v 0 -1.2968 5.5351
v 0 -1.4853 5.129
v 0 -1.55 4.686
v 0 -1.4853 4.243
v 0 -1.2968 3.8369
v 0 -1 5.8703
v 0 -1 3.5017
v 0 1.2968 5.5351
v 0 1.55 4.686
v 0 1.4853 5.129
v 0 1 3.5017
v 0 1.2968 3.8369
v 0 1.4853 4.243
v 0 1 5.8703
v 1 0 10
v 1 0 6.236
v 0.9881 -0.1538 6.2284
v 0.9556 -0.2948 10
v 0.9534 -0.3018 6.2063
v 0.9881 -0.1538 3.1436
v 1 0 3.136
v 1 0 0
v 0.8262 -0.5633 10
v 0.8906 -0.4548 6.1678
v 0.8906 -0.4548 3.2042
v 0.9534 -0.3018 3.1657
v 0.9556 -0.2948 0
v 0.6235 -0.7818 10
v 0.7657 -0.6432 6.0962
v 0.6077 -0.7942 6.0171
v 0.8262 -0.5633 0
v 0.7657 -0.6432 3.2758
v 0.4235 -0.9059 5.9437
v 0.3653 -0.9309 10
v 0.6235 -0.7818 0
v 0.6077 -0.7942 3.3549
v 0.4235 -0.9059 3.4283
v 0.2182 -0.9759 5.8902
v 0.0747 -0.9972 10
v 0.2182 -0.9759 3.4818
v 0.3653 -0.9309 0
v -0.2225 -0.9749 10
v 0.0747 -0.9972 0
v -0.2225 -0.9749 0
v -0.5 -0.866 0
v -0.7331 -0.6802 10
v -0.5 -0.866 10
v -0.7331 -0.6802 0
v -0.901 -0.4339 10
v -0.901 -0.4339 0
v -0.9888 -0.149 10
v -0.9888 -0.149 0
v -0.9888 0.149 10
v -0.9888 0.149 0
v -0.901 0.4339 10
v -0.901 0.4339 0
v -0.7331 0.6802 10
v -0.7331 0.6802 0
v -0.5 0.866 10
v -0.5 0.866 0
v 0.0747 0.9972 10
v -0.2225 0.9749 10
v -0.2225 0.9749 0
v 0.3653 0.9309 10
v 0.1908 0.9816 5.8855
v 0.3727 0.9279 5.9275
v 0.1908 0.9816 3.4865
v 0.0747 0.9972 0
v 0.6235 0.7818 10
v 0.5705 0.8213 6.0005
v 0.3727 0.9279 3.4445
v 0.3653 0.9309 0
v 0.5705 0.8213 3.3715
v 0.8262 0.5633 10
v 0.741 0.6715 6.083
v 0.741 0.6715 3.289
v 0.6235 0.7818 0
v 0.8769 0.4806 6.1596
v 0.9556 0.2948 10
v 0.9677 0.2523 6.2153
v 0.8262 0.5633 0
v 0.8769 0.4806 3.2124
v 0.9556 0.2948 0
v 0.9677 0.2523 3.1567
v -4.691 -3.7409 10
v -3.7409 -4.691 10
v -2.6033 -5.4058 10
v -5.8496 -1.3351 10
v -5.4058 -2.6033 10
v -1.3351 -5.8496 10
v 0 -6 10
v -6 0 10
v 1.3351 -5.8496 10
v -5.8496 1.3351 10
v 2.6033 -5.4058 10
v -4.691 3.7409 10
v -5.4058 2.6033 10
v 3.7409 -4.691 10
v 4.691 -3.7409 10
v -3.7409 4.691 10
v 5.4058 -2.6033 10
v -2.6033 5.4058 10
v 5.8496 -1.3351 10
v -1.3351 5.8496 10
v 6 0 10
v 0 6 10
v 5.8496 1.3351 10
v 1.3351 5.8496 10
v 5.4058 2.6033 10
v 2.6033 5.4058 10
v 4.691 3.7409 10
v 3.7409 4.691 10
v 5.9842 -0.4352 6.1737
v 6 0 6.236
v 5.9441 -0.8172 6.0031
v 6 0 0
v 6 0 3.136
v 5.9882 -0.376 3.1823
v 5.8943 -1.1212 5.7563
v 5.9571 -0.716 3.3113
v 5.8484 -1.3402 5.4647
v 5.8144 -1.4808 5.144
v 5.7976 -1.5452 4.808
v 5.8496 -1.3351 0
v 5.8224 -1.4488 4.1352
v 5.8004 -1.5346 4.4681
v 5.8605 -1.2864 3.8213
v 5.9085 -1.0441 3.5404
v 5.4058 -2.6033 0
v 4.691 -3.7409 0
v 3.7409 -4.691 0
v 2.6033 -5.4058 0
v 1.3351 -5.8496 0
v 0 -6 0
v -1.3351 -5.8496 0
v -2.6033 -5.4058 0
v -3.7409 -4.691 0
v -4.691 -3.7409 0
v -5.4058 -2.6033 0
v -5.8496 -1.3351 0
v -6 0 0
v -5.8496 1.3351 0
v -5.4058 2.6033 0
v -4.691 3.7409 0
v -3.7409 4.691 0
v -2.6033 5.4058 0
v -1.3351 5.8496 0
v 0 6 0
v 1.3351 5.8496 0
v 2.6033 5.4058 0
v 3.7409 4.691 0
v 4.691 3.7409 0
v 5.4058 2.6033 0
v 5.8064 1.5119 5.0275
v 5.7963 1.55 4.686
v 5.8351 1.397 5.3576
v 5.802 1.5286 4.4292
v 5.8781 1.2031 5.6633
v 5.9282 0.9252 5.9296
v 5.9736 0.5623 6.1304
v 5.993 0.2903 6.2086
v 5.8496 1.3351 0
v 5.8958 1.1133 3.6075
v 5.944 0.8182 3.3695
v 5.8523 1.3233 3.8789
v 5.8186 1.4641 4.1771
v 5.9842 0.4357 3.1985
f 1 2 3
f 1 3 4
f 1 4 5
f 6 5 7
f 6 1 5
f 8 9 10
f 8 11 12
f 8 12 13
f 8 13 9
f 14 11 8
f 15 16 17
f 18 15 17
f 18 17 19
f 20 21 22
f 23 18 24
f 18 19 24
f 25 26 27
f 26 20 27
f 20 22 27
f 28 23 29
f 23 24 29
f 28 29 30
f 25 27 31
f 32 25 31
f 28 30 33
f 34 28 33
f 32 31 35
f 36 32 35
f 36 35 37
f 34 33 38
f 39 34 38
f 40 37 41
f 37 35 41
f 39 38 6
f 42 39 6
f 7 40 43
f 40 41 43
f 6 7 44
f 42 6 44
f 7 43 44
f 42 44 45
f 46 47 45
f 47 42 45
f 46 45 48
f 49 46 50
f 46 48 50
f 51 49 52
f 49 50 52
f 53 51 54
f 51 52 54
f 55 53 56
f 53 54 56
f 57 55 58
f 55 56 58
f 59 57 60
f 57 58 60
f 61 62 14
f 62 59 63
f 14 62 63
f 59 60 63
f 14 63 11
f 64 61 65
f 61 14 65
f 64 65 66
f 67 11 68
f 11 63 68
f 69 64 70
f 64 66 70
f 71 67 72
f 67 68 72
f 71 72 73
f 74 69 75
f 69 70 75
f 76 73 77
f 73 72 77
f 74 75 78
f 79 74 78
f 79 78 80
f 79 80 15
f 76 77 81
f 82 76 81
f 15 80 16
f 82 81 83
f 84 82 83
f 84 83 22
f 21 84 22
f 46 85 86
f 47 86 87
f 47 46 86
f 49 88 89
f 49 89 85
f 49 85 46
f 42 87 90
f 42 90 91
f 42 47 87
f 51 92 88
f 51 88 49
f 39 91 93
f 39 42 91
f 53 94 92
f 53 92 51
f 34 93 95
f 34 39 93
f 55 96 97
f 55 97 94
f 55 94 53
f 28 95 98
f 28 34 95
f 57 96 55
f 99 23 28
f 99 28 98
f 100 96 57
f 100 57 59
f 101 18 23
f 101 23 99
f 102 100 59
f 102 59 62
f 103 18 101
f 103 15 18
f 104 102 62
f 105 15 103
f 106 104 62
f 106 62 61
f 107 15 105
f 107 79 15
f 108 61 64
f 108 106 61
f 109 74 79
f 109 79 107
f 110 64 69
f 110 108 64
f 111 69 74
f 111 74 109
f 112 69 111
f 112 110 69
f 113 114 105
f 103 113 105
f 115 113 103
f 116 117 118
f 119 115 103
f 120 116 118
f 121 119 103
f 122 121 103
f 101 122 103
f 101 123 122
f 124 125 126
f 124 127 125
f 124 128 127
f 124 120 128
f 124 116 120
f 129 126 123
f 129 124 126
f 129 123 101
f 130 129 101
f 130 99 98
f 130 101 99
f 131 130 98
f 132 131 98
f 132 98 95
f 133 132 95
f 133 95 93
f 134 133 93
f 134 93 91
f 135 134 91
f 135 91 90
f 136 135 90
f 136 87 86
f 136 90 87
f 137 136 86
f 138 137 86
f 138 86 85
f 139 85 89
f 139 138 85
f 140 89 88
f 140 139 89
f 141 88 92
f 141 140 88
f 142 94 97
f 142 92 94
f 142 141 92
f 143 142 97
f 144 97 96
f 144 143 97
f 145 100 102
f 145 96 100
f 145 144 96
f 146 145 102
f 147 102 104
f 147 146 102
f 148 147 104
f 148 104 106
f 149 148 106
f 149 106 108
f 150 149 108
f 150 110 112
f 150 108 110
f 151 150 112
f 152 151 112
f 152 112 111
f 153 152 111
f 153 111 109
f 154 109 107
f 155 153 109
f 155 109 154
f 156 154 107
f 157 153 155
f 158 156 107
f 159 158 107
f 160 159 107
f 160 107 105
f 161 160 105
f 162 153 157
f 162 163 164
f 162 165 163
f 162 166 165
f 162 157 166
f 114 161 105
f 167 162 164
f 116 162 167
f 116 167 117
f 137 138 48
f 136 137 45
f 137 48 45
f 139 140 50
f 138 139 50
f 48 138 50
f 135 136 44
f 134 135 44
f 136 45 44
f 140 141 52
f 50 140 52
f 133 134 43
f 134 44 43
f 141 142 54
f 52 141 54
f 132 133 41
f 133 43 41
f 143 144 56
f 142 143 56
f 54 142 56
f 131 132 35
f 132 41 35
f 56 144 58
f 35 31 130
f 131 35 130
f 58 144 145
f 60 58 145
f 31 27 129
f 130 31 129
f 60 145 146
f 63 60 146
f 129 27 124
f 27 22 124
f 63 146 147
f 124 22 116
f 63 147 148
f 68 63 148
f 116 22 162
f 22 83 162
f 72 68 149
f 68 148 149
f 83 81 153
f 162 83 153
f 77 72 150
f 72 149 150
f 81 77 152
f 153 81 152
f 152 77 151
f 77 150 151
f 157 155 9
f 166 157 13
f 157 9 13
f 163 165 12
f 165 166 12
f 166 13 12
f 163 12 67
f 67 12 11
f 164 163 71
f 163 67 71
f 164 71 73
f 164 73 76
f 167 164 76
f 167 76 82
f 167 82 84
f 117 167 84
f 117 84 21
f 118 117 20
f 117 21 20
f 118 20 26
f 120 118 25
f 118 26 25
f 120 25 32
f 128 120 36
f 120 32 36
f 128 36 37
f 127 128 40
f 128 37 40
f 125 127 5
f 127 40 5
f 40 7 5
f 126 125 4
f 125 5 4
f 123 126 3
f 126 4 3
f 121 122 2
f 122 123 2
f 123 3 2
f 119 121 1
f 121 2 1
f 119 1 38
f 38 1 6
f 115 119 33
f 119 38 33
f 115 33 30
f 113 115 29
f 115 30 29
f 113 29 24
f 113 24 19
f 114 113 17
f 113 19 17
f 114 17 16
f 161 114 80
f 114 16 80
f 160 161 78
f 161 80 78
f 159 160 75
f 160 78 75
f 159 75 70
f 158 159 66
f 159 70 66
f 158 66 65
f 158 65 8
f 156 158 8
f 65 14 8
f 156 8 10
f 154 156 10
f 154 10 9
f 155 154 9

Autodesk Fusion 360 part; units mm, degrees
sketch "Sketch1" plane through (0, 0, 0) normal (0, 0, 1) x (1, 0, 0)
  circle A0 centre (0, 0) radius 6
  circle A1 centre (0, 0) radius 1
  dimension "d1" = 2
  dimension "d12" = 12
extrude "Extrude1" add sketch "Sketch1" along normal blind 10
sketch "Sketch2" plane through (0, 0, 0) normal (1, 0, 0) x (0, 1, 0)
  circle A0 centre (0, 4.686) radius 1.55
  dimension "d4" = 3.1
extrude "Extrude2" cut sketch "Sketch2" along normal blind 12
sketch "Sketch3" plane through (0, 0, 10) normal (0, 0, 1) x (-1, 0, 0)
  circle A0 centre (0, 0) radius 1
  circle A1 centre (0, 0) radius 6
  line L0 (-2, 0.003) -> (-2, 3.003)
  line L1 (-2, 0.003) -> (-2, -2.997)
  line L2 (-2, 3.003) -> (-4.5, 3.003)
  line L3 (-2, -2.997) -> (-4.5, -2.997)
  line L4 (-4.5, 3.003) -> (-4.5, -2.997)
  dimension "d7" = 3
  dimension "d8" = 3
  dimension "d9" = 2.5
  dimension "d10" = 2.5
  dimension "d11" = 2
extrude "Extrude3" [suppressed]
